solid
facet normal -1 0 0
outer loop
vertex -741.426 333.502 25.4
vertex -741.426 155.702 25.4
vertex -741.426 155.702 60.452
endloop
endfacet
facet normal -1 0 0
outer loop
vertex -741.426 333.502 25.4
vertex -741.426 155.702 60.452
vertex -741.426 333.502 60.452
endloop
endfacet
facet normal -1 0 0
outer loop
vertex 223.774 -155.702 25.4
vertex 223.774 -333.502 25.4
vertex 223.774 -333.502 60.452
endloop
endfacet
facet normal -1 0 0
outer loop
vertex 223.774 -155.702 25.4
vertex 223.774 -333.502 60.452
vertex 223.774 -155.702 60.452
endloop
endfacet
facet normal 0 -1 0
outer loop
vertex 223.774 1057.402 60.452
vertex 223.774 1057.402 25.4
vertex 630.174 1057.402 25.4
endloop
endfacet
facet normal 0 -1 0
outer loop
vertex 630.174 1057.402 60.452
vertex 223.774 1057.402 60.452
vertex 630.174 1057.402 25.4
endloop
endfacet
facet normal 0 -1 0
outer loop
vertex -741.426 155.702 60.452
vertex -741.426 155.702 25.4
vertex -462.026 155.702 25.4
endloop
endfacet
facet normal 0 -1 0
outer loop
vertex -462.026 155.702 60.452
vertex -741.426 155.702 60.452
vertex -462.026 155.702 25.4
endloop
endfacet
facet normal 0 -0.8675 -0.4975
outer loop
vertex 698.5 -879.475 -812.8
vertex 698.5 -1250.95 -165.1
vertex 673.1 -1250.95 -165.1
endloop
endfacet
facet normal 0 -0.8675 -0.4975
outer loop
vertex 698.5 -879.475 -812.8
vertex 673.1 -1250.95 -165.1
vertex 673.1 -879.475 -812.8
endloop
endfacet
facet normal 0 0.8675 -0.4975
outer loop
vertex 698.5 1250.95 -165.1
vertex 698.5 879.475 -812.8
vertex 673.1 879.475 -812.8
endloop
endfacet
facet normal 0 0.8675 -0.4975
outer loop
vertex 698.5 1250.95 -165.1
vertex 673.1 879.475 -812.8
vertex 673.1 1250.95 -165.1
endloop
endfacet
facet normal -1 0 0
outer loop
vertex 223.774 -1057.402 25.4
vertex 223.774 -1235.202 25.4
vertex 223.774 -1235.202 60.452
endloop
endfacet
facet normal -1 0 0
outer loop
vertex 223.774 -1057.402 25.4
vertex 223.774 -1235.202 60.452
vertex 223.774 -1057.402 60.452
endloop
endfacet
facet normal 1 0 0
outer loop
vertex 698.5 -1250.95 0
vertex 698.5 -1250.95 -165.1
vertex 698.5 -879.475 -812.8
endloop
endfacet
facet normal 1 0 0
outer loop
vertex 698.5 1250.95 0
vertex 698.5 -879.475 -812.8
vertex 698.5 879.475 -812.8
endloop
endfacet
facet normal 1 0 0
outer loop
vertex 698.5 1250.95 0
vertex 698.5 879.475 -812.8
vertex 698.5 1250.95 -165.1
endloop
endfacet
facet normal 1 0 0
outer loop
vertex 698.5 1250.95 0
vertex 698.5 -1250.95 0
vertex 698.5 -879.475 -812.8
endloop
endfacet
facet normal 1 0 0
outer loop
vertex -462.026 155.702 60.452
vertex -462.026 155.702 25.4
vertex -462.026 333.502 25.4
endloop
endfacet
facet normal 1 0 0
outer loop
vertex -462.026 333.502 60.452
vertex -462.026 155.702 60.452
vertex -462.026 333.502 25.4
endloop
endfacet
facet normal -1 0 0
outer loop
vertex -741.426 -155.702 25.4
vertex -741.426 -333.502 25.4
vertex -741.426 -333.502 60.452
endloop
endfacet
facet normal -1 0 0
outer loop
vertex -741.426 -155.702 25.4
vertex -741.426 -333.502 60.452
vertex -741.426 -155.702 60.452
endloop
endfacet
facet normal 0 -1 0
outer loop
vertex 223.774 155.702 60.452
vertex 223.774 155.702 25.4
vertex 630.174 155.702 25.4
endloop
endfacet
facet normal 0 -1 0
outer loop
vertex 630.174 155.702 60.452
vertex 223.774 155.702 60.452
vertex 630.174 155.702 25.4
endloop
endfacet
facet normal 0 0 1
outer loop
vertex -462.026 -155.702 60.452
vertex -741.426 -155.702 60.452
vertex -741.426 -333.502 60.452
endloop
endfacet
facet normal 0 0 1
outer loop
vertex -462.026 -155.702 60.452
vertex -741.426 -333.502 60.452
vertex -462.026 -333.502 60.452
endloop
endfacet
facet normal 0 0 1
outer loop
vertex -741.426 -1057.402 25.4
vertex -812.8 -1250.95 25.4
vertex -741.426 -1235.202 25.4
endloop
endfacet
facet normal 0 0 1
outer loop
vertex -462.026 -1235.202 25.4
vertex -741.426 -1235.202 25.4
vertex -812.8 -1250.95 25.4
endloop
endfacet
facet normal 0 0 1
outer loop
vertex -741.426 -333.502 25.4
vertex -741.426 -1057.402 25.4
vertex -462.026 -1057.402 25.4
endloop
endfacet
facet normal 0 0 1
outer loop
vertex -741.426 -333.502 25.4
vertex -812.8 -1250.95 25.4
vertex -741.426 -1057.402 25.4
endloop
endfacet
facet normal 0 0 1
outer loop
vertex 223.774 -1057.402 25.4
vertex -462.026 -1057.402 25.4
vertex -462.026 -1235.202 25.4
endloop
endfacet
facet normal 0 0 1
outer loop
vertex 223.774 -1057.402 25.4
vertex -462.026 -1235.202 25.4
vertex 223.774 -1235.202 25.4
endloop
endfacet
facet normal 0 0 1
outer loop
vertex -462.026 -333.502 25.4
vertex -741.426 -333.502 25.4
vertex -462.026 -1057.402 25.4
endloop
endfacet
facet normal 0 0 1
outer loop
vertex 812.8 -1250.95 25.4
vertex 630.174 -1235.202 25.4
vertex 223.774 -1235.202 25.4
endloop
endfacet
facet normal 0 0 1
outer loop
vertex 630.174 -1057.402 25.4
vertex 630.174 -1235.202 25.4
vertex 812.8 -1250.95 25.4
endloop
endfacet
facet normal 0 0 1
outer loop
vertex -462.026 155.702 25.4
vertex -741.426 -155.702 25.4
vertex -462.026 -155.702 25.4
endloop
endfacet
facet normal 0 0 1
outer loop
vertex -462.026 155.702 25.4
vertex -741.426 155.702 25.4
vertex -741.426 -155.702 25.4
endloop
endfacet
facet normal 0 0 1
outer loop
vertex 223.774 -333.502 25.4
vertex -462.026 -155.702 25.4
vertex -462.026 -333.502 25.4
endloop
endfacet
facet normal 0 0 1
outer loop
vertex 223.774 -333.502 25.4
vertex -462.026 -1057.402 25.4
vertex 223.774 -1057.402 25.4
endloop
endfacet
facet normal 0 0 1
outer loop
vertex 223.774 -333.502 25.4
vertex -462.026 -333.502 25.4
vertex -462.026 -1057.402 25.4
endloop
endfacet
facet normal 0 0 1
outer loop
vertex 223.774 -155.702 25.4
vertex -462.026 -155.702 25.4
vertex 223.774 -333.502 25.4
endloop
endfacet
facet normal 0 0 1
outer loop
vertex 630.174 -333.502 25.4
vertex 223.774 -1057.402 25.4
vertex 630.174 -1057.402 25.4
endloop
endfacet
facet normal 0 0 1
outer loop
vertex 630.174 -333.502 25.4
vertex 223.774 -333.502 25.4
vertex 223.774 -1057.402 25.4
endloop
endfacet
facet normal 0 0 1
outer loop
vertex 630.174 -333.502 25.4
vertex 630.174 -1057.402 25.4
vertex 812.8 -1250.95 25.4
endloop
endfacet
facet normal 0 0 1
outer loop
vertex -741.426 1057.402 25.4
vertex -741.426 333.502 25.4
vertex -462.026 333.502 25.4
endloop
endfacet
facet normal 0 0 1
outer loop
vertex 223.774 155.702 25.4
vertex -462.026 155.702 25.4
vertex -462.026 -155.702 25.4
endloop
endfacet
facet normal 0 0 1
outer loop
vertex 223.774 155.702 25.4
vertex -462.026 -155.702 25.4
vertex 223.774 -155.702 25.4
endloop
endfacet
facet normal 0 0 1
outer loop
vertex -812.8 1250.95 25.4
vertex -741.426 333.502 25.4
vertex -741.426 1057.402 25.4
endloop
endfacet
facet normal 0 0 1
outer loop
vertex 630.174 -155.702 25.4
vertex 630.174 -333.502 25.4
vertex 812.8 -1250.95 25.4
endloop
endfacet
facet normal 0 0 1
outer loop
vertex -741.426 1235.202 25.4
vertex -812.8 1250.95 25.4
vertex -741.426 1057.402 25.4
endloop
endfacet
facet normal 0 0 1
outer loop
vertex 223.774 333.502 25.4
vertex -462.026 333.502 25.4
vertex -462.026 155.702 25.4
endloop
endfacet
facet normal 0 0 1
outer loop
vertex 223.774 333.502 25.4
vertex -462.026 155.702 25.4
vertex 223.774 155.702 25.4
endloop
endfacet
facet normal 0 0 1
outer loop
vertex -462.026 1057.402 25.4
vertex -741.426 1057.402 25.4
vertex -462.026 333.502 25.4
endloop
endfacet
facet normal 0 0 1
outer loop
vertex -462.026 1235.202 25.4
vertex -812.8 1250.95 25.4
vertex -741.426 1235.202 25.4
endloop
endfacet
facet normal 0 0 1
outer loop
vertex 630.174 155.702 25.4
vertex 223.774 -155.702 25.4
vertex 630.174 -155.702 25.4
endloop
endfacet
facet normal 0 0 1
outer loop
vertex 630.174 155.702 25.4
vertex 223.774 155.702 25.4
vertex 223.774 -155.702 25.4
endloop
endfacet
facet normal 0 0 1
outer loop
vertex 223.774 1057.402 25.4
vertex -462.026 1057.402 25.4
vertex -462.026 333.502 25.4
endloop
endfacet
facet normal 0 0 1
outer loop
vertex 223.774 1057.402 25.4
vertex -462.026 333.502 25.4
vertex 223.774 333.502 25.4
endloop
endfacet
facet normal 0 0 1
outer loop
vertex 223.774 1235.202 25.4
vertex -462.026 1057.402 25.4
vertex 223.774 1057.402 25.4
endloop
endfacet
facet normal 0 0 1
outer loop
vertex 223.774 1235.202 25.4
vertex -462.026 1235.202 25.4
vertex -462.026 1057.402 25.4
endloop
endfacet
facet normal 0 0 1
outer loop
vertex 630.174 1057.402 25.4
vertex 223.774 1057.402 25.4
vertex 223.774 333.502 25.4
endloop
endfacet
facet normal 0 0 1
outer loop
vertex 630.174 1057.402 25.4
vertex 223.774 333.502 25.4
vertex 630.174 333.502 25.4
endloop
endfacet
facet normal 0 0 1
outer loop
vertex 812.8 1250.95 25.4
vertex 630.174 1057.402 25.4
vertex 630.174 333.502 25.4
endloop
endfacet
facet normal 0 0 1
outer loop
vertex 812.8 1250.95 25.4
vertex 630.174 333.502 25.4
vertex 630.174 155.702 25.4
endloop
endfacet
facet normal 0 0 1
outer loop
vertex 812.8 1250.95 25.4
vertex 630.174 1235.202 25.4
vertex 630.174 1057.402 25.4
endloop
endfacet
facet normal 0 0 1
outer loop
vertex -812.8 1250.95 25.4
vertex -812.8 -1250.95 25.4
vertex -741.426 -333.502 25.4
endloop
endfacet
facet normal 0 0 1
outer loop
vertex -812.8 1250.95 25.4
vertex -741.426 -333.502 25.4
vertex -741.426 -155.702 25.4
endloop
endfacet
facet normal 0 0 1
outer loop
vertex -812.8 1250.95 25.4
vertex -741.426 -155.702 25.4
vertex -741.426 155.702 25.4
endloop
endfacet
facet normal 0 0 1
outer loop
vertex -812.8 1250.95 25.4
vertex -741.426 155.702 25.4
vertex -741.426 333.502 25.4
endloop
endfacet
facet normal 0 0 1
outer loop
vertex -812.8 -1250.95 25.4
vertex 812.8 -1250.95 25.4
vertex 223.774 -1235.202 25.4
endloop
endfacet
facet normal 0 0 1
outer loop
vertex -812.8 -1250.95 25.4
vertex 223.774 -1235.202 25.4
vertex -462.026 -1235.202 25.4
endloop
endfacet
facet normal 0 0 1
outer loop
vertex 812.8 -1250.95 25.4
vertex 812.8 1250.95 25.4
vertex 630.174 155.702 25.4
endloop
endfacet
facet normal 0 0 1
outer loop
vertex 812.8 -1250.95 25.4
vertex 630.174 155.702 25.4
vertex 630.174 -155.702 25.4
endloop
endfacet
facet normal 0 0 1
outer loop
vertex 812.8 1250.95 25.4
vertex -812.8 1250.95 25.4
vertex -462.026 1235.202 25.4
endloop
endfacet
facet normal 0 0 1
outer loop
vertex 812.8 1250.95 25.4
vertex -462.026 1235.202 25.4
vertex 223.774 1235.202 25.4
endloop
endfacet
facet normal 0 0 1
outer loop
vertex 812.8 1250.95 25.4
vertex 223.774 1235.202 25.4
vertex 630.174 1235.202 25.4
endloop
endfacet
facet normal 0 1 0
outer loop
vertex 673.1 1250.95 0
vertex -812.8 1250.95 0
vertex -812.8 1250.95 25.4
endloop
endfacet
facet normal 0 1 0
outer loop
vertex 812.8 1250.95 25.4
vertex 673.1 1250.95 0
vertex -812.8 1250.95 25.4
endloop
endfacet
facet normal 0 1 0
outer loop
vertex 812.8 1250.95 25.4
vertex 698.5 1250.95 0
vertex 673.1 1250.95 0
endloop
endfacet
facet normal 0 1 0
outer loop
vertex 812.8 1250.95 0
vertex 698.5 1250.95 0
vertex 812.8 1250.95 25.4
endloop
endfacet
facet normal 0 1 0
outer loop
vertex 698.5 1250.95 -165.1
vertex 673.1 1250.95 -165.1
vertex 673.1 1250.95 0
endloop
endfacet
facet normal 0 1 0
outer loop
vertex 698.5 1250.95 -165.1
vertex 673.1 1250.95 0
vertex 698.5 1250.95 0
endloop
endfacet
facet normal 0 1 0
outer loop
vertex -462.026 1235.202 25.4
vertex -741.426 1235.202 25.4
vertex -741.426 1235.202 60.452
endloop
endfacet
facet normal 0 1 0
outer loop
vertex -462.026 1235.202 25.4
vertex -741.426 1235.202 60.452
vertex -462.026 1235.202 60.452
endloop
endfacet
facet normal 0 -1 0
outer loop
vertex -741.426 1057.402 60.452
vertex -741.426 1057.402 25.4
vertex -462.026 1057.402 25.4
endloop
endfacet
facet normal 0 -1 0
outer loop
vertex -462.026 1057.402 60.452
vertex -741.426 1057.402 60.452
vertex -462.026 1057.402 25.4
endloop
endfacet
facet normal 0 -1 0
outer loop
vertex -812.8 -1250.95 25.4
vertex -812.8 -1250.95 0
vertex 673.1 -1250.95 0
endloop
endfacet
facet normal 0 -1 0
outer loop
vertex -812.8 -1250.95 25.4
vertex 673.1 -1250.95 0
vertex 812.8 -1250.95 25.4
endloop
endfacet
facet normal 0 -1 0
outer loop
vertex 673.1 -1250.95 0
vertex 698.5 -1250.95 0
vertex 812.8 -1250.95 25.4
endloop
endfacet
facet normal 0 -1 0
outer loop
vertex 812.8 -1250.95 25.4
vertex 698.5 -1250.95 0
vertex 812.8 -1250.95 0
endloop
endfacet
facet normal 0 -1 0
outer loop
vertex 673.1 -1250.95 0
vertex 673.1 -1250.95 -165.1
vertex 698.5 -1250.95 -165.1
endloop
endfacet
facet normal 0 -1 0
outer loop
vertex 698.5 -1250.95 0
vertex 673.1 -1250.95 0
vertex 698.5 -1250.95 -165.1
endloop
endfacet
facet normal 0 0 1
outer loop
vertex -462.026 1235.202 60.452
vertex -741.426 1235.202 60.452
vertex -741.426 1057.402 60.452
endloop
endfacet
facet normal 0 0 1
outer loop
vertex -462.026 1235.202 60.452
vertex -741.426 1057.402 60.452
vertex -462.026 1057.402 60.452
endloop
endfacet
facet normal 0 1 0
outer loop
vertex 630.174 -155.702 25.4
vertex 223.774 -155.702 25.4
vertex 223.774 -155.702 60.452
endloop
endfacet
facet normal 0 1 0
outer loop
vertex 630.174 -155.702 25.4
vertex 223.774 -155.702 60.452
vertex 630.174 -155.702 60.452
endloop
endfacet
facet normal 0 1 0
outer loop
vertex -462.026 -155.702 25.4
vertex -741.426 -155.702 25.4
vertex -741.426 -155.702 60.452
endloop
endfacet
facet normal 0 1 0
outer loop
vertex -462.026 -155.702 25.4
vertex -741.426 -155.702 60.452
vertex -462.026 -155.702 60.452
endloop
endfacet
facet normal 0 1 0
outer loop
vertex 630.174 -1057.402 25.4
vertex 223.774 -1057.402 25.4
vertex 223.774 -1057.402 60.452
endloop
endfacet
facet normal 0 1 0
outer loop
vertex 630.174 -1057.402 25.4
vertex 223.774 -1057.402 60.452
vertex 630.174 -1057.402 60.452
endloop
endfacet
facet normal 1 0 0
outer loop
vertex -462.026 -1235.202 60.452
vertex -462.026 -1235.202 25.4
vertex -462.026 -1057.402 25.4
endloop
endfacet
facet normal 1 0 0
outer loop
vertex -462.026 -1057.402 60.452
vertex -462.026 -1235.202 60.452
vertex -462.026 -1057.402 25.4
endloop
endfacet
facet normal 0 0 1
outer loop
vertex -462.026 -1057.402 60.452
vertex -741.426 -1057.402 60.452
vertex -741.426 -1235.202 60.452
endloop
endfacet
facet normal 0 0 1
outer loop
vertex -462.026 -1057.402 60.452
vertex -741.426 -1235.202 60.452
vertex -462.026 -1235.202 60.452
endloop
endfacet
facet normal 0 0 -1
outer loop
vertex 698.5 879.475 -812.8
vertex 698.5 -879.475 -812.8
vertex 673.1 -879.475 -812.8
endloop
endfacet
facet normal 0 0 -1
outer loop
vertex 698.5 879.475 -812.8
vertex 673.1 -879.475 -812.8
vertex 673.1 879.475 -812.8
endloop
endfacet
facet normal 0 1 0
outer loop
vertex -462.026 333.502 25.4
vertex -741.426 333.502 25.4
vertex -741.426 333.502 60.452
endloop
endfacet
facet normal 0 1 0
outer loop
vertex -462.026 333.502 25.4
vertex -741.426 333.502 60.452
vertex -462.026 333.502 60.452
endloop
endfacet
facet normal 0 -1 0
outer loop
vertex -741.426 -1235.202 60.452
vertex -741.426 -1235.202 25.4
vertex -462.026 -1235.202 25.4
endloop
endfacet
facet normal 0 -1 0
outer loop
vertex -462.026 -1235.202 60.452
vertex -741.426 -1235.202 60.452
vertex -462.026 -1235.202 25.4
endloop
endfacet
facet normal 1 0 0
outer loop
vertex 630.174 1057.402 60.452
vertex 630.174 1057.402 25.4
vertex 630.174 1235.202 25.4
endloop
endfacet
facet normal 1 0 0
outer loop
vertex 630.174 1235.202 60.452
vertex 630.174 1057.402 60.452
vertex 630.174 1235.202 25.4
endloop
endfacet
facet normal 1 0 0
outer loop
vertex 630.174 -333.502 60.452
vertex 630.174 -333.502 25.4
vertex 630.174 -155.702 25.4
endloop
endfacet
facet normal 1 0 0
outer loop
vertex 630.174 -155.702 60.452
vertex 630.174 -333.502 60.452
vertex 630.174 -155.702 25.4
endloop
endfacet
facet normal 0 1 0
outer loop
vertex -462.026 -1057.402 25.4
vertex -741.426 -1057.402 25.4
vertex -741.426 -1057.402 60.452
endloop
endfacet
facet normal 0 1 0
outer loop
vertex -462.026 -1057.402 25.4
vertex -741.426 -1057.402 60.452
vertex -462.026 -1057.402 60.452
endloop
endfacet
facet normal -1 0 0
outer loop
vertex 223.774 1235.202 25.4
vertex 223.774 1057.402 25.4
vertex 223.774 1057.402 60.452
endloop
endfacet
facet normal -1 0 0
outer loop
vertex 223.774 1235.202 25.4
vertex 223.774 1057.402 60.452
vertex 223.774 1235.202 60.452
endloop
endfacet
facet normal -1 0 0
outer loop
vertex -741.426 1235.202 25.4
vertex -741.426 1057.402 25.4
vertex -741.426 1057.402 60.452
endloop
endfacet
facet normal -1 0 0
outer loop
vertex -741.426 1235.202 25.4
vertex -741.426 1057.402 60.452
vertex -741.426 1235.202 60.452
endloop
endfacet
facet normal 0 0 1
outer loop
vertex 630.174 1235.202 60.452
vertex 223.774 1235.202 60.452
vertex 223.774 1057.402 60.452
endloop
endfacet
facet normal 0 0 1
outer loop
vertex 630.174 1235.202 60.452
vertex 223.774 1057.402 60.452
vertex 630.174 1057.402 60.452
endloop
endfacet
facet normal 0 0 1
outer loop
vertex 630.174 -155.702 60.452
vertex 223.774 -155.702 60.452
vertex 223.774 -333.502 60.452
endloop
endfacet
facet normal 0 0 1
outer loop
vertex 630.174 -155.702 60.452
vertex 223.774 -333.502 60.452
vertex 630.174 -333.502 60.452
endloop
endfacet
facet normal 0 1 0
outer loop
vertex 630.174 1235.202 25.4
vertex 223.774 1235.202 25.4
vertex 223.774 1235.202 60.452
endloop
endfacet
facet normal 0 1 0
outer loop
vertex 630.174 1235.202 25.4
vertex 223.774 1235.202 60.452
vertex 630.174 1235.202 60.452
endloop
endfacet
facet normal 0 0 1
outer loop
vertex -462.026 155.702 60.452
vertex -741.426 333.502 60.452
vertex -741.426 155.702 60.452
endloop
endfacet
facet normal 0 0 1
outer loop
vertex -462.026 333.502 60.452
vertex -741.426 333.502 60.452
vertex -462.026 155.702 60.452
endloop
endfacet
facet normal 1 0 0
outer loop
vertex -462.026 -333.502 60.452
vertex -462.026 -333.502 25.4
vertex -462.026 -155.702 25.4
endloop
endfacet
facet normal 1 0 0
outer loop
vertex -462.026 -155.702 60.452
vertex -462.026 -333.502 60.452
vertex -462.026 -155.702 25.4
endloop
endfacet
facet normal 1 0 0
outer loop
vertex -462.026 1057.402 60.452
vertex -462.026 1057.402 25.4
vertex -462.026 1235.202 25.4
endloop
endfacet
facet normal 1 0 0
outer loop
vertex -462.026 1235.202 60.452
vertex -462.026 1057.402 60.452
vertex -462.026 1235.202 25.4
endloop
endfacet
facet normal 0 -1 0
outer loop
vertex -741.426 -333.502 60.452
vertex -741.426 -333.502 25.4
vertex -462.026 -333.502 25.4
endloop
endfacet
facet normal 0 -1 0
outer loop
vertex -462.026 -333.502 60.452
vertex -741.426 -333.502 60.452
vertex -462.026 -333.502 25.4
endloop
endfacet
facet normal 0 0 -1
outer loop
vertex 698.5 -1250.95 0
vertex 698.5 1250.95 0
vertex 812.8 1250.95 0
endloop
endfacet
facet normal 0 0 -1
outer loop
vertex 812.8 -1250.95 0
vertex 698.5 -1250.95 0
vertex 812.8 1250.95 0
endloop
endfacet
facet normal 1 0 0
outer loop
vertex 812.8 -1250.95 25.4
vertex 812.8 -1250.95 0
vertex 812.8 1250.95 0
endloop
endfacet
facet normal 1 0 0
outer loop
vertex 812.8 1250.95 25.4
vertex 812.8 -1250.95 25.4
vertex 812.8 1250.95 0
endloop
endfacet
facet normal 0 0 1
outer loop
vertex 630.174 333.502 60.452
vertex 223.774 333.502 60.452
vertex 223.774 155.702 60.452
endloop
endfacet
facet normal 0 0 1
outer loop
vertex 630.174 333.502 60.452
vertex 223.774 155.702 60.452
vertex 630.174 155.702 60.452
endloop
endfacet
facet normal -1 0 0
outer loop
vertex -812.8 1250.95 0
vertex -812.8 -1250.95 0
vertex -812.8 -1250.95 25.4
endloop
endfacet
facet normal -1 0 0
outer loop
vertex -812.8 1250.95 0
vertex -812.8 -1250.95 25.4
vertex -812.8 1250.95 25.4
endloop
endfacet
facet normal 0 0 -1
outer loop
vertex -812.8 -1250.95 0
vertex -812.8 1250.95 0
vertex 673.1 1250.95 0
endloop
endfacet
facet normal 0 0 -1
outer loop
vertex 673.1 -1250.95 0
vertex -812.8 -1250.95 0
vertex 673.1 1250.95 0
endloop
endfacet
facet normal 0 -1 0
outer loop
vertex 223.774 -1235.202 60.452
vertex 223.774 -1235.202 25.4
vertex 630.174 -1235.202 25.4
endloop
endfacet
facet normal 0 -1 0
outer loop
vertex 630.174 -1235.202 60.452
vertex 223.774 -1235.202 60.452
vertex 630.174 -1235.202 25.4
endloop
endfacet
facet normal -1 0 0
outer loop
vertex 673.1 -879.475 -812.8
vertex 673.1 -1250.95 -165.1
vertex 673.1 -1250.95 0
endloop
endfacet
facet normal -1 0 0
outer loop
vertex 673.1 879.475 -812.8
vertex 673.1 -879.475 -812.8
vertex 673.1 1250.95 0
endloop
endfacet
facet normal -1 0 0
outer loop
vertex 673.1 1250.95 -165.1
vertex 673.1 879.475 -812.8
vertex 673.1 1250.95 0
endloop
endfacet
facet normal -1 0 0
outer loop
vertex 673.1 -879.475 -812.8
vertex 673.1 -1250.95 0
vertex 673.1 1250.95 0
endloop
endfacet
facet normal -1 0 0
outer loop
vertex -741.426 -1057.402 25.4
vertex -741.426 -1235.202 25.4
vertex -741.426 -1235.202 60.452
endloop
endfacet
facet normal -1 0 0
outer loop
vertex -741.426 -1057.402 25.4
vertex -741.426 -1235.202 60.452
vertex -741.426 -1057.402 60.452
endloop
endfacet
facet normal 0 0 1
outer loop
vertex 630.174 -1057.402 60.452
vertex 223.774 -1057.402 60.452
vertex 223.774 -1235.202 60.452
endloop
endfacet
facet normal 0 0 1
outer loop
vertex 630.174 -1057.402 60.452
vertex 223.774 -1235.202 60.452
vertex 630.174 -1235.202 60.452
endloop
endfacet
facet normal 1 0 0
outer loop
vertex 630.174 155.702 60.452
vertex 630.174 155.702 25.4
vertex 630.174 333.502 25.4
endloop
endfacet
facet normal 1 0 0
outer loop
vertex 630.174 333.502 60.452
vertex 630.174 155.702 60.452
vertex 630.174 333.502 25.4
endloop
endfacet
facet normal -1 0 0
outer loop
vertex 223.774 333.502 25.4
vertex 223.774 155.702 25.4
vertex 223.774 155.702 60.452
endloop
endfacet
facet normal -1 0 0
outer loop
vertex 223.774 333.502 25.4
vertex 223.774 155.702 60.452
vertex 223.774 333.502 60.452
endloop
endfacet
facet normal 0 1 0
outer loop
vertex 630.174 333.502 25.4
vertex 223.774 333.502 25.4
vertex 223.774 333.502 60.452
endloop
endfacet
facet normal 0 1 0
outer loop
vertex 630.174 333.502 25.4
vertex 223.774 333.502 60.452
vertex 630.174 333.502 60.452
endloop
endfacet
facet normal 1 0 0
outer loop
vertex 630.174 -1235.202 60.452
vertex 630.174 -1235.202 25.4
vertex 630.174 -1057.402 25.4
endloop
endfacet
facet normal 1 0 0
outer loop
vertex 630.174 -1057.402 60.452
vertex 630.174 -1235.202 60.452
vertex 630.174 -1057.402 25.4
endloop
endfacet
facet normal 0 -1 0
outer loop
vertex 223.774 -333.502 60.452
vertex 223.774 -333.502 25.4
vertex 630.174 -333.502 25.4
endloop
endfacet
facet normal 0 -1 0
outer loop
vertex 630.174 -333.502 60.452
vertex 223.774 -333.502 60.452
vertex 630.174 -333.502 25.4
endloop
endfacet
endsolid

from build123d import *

# Parameters (mm, degrees)
F0_W     = 1625.6
F0_H     = 2501.9
F1_DEPTH = 25.4
F2_W     = 279.4
F2_H     = 177.8
F2_W_2   = 406.4
F3_DEPTH = 35.052
F5_W     = 2501.9
F5_H     = 165.1
F6_DEPTH = 25.4


with BuildPart() as f1:
    # F0 (on Top) → F1 (new body)
    with BuildSketch(Plane.XY):
        Rectangle(F0_W, F0_H)
    extrude(amount=F1_DEPTH)

    # F2 (on face) → F3 (join)
    with BuildSketch(Plane.XY.offset(25.4)):
        with Locations((-601.726, -1146.302)):
            Rectangle(F2_W, F2_H)
        with Locations((-601.726, -244.602)):
            Rectangle(F2_W, F2_H)
        with Locations((426.974, -244.602)):
            Rectangle(F2_W_2, F2_H)
        with Locations((426.974, -1146.302)):
            Rectangle(F2_W_2, F2_H)
        with Locations((426.974, 1146.302)):
            Rectangle(F2_W_2, F2_H)
        with Locations((-601.726, 1146.302)):
            Rectangle(F2_W, F2_H)
        with Locations((-601.726, 244.602)):
            Rectangle(F2_W, F2_H)
        with Locations((426.974, 244.602)):
            Rectangle(F2_W_2, F2_H)
    extrude(amount=F3_DEPTH)

    # F5 (on offset) → F6 (join)
    with BuildSketch(Plane.YZ.offset(698.5)):
        with Locations((0, -82.55)):
            Rectangle(F5_W, F5_H)
        Polygon((879.475, -812.8), (1250.95, -165.1), (-1250.95, -165.1), (-879.475, -812.8), align=None)
    extrude(amount=-F6_DEPTH)


solid = f1.part
